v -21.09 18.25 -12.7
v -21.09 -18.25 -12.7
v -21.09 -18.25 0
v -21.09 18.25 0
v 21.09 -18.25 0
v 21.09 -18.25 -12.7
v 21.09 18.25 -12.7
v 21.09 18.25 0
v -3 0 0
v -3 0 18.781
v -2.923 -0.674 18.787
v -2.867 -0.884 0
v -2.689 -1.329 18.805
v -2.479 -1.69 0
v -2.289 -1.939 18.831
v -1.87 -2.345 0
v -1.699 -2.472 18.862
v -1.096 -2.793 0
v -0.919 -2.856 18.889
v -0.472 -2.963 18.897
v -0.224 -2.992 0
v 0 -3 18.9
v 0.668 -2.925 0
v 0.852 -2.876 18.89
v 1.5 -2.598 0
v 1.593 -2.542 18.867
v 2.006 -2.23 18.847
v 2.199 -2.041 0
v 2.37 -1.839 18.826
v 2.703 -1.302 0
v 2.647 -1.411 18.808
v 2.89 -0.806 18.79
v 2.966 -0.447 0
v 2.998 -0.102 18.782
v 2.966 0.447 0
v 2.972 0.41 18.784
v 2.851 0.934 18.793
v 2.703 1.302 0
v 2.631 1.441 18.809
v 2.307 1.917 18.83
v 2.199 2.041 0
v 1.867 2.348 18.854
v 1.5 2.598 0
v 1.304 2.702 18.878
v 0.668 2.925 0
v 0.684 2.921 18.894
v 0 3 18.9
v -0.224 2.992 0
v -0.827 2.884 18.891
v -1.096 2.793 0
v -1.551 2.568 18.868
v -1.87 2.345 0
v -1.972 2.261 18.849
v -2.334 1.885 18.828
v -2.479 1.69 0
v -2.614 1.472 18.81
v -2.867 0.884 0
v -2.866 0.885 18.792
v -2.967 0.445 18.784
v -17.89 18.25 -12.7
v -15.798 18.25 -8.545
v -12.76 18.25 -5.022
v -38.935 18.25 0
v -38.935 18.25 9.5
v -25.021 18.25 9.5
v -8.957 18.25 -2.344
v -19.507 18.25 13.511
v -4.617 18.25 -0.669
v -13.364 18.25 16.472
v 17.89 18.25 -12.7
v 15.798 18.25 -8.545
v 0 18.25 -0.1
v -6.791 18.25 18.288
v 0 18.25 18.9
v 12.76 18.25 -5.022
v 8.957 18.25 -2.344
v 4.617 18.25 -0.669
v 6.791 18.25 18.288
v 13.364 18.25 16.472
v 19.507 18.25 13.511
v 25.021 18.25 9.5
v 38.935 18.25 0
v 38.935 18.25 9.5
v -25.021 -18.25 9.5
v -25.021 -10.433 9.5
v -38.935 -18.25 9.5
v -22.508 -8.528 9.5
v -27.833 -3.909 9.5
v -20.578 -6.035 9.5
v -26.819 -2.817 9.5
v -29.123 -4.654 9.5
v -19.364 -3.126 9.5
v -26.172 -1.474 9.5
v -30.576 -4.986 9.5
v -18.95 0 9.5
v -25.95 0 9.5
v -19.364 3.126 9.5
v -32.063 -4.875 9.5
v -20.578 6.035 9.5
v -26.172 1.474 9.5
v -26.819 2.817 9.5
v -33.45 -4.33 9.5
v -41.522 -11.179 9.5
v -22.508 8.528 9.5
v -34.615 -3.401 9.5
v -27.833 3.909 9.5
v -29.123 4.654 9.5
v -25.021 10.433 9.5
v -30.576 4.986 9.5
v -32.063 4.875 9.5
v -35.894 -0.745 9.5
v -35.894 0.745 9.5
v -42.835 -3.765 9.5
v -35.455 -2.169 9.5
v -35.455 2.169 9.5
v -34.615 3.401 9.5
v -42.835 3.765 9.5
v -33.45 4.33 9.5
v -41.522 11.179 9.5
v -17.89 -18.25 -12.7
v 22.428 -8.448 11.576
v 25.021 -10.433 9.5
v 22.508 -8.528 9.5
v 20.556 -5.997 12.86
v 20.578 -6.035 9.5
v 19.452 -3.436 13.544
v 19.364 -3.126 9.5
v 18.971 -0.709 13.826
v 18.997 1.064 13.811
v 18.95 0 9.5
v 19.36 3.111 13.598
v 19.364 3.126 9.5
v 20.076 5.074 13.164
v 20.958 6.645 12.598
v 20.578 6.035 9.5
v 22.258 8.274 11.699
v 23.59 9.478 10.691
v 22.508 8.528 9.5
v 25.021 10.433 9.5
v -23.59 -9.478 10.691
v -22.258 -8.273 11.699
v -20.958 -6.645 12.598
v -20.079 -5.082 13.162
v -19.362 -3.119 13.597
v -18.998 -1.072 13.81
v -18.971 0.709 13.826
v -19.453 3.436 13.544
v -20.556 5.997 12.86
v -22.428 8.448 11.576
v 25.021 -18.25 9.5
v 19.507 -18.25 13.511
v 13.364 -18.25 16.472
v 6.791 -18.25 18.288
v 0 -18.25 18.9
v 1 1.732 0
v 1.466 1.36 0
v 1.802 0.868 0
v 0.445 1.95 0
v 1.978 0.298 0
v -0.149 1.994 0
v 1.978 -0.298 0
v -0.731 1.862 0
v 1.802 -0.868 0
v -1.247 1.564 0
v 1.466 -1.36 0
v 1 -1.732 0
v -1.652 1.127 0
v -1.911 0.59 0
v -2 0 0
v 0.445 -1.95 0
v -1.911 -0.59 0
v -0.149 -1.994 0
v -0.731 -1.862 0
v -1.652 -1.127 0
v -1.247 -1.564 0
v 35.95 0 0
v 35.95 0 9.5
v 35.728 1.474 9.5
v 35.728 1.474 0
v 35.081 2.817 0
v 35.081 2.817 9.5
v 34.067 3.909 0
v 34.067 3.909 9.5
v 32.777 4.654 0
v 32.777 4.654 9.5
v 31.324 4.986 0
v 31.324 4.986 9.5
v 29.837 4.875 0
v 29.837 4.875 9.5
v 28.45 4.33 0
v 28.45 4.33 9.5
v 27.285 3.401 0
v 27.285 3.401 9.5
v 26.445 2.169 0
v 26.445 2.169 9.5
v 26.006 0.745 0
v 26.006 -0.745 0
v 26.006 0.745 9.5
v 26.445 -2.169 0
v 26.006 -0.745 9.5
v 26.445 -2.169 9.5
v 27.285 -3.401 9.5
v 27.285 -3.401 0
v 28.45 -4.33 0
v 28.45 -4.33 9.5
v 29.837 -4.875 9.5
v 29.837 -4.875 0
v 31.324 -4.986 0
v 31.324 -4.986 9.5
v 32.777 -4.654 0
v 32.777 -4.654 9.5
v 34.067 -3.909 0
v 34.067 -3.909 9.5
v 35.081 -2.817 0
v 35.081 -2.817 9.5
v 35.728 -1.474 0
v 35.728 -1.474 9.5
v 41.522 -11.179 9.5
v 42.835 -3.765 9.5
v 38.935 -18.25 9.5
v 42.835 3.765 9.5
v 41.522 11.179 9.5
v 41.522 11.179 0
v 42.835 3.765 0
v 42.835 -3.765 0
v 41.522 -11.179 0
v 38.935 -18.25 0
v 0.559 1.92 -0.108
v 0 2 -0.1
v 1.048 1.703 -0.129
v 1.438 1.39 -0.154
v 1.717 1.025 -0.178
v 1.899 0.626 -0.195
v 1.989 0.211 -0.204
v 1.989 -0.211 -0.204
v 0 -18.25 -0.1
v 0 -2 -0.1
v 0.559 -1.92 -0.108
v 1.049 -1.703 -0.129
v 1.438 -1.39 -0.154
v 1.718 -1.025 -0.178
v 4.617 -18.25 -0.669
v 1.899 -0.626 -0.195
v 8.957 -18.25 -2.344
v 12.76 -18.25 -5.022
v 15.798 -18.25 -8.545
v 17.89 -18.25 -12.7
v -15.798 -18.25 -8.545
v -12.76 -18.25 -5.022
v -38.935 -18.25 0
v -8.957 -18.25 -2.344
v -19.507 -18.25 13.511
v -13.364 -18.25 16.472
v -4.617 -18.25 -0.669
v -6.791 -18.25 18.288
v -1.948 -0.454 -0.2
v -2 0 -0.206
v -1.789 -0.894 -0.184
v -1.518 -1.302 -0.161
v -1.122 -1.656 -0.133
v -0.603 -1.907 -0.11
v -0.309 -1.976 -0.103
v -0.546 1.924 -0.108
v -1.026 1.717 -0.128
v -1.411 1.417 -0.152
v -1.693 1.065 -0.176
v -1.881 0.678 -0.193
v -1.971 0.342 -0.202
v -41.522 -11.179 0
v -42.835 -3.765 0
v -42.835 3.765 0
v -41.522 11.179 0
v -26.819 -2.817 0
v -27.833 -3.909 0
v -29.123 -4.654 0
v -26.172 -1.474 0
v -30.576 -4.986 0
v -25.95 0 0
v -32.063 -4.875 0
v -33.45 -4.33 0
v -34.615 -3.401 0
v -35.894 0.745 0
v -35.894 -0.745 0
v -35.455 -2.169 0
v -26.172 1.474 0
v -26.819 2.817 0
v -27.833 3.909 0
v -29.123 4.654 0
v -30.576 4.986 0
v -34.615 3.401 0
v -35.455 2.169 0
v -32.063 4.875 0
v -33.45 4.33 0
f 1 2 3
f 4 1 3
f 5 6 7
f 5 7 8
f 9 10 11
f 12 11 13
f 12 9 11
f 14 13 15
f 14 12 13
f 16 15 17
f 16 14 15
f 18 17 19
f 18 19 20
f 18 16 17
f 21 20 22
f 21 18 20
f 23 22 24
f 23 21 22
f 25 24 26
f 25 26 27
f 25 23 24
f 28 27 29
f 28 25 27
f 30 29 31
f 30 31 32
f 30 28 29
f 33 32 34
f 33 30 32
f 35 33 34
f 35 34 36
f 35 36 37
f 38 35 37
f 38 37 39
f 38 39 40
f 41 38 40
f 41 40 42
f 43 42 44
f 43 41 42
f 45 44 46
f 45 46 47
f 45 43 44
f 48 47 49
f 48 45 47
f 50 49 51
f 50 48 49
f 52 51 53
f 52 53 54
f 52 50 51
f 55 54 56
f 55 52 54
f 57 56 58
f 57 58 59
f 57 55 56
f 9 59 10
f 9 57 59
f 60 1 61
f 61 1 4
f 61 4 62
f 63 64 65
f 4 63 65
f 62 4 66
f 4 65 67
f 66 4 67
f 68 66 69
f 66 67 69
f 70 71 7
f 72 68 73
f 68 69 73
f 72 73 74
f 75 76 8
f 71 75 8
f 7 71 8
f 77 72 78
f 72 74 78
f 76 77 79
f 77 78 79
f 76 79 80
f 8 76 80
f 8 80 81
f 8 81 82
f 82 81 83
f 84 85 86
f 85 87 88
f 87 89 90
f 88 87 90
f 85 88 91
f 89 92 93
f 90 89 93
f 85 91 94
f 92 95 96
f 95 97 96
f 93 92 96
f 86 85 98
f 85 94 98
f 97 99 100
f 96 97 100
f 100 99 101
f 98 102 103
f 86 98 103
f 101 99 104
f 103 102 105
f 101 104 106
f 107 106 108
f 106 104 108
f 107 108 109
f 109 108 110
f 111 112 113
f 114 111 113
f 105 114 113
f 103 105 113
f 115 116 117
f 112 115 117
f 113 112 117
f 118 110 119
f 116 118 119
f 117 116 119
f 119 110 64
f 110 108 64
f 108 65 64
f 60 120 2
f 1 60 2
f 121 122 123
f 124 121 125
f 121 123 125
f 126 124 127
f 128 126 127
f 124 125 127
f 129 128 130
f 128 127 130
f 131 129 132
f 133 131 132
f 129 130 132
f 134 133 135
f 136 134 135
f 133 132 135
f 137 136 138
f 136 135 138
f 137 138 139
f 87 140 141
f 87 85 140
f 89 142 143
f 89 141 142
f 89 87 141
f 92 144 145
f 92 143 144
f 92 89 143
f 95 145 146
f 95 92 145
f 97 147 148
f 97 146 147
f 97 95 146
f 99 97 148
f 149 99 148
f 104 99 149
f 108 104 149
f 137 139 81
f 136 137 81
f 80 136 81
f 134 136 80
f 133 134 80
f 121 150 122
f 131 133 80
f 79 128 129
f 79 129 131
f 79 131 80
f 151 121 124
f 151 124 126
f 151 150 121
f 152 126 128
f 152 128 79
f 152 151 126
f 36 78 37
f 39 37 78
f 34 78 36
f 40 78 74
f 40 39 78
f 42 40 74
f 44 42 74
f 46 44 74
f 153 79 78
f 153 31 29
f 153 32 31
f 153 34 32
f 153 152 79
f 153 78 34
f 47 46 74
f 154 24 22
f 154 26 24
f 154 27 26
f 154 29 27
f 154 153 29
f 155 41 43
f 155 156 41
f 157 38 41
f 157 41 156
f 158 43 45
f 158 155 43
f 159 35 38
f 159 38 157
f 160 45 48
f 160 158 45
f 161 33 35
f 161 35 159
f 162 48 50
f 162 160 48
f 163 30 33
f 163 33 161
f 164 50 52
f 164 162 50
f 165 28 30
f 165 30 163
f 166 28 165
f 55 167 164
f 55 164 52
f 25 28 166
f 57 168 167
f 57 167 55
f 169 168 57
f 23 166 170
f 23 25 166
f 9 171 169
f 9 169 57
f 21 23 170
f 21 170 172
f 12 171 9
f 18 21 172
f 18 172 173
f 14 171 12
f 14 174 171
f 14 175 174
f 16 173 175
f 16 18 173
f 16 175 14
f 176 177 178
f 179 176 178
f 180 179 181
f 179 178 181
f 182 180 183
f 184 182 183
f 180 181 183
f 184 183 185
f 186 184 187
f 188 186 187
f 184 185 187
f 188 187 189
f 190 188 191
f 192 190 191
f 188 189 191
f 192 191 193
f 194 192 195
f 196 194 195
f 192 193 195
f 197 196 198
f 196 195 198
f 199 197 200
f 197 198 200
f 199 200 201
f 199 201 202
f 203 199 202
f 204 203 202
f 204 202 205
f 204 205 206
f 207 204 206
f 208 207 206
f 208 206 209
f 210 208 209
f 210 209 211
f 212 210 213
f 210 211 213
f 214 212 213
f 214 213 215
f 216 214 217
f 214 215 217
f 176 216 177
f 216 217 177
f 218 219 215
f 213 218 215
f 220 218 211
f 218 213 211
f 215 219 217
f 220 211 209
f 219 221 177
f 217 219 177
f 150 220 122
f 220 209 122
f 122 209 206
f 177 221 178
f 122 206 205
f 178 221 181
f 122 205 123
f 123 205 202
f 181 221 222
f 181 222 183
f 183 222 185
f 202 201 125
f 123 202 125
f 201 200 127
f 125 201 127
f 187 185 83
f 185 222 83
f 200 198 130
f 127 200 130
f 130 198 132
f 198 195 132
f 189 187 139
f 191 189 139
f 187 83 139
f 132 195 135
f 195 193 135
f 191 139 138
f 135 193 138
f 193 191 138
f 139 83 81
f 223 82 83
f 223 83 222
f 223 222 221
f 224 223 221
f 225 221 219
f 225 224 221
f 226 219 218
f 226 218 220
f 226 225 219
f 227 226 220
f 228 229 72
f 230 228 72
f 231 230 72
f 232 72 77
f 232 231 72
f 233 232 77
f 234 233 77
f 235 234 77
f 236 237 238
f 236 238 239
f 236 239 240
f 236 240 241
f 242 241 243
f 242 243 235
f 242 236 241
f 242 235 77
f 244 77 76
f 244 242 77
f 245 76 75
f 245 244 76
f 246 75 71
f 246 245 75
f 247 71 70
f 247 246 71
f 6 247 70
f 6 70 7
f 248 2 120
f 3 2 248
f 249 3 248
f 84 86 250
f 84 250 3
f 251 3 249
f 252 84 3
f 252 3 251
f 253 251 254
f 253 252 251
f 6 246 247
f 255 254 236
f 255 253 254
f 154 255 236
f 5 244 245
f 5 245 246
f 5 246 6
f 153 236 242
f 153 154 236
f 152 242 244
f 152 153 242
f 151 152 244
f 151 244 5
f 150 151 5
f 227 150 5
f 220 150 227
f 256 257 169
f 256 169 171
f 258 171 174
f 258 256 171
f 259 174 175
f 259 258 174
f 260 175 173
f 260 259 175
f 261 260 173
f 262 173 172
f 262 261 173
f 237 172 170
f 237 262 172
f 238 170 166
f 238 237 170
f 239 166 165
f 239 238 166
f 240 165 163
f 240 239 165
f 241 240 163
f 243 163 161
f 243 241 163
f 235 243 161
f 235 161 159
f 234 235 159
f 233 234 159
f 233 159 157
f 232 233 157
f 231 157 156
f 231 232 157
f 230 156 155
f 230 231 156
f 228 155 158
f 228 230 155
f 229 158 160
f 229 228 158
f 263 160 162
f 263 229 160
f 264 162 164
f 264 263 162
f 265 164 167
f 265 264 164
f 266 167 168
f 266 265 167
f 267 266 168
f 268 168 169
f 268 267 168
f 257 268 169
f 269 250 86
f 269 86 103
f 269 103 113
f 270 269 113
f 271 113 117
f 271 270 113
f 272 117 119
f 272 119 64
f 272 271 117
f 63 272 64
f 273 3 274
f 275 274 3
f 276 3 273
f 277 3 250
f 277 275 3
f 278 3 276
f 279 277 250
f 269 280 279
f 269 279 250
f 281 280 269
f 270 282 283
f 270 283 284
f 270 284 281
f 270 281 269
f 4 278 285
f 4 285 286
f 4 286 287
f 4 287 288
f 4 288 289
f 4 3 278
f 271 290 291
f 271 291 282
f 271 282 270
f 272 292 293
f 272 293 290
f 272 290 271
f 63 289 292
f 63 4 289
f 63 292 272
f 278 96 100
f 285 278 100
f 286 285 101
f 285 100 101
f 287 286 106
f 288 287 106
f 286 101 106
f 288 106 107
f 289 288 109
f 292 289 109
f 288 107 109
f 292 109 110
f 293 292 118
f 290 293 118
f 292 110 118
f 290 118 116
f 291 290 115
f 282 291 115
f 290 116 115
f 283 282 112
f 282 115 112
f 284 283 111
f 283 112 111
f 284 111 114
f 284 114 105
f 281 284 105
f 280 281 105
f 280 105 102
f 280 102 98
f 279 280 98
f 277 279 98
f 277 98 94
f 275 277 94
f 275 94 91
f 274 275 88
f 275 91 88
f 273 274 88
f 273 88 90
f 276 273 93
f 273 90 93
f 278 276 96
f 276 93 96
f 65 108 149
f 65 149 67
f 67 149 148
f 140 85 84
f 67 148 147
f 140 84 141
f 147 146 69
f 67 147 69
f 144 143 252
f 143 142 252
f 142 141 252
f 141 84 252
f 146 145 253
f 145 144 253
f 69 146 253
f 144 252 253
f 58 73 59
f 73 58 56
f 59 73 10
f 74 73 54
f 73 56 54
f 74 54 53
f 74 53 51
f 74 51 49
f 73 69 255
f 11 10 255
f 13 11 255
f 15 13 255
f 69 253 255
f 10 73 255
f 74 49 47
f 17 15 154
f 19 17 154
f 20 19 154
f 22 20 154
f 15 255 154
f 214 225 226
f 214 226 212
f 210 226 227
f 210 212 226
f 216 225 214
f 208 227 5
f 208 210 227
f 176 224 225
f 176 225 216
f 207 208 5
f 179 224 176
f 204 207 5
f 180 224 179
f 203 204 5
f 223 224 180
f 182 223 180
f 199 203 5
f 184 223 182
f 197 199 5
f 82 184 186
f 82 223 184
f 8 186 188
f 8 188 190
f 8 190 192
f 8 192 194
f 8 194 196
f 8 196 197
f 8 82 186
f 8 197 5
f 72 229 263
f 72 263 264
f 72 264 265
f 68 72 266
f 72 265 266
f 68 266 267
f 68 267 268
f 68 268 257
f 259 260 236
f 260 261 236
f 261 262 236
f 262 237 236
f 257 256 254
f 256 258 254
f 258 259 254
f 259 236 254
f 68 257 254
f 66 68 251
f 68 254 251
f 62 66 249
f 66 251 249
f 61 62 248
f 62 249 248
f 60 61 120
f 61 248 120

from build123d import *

# Parameters (mm, degrees)
BOSS_EXTRUDE1_DEPTH = 9.5
SKETCH4_R           = 5
CUT_EXTRUDE1_DEPTH  = 9.5
BOSS_EXTRUDE2_DEPTH = 36.5
SKETCH8_R           = 12
CUT_EXTRUDE2_DEPTH  = 52.719459587


with BuildPart() as part:
    # Sketch3 → Boss-Extrude1 (new body)
    with BuildSketch(Plane.XY):
        with BuildLine():
            Line((-38.935042057, 18.25), (38.935042057, 18.25))
            ThreePointArc((38.935042057, 18.25), (43, 0), (38.935042057, -18.25))
            Line((38.935042057, -18.25), (-38.935042057, -18.25))
            ThreePointArc((-38.935042057, -18.25), (-43, 0), (-38.935042057, 18.25))
        make_face()
    extrude(amount=BOSS_EXTRUDE1_DEPTH)

    # Sketch4 → Cut-Extrude1 (cut)
    with BuildSketch(Plane.XY.offset(9.5)):
        with Locations((-30.95, 0)):
            Circle(SKETCH4_R)
        with Locations((30.95, 0)):
            Circle(SKETCH4_R)
    extrude(amount=-CUT_EXTRUDE1_DEPTH, mode=Mode.SUBTRACT)

    # Sketch7 → Boss-Extrude2 (add)
    with BuildSketch(Plane.XZ.offset(18.25)):
        with BuildLine():
            Line((0, 0), (0, -0.1))
            ThreePointArc((0, -0.1), (-10.940749517, -3.566165959), (-17.889661819, -12.7))
            Line((-17.889661819, -12.7), (-21.089661819, -12.7))
            Line((-21.089661819, -12.7), (-21.089661819, 0))
            Line((-21.089661819, 0), (0, 0))
        make_face()
        with BuildLine():
            Line((0, 18.9), (0, 9.5))
            Line((0, 9.5), (-25.020791354, 9.5))
            ThreePointArc((-25.020791354, 9.5), (-13.364131098, 16.472461259), (0, 18.9))
        make_face()
    boss_extrude2 = extrude(amount=-BOSS_EXTRUDE2_DEPTH)

    # Mirror1: Boss-Extrude2 across plane
    add(boss_extrude2.mirror(Plane(origin=(0, 0, 0), x_dir=(0, 0, 1), z_dir=(1, 0, 0))))

    # Sketch8 → Cut-Extrude2 (cut, through all)
    with BuildSketch(Plane.XY.offset(9.5)):
        with Locations((-30.95, 0)):
            Circle(SKETCH8_R)
    cut_extrude2 = extrude(amount=CUT_EXTRUDE2_DEPTH, mode=Mode.SUBTRACT)

    # Mirror2: Cut-Extrude2 across plane
    add(cut_extrude2.mirror(Plane(origin=(0, 0, 0), x_dir=(0, 0, 1), z_dir=(1, 0, 0))), mode=Mode.SUBTRACT)

    # Sketch9 → Cut-Revolve1 (revolve, cut)
    with BuildSketch(Plane(origin=(0, 0, 0), x_dir=(0, 0, -1), z_dir=(1, 0, 0)), mode=Mode.PRIVATE) as cut_revolve1_sk:
        Polygon((-18.9, 0), (-18.9, 3), (0, 3), (0, 2), (13.728327228, 2), (13.728327228, 0), align=None)
    revolve(cut_revolve1_sk.sketch.rotate(Axis((0, 0, -13.728327228), (0, 0, 1)), 90), axis=Axis((0, 0, -13.728327228), (0, 0, 1)), mode=Mode.SUBTRACT)


solid = part.part
